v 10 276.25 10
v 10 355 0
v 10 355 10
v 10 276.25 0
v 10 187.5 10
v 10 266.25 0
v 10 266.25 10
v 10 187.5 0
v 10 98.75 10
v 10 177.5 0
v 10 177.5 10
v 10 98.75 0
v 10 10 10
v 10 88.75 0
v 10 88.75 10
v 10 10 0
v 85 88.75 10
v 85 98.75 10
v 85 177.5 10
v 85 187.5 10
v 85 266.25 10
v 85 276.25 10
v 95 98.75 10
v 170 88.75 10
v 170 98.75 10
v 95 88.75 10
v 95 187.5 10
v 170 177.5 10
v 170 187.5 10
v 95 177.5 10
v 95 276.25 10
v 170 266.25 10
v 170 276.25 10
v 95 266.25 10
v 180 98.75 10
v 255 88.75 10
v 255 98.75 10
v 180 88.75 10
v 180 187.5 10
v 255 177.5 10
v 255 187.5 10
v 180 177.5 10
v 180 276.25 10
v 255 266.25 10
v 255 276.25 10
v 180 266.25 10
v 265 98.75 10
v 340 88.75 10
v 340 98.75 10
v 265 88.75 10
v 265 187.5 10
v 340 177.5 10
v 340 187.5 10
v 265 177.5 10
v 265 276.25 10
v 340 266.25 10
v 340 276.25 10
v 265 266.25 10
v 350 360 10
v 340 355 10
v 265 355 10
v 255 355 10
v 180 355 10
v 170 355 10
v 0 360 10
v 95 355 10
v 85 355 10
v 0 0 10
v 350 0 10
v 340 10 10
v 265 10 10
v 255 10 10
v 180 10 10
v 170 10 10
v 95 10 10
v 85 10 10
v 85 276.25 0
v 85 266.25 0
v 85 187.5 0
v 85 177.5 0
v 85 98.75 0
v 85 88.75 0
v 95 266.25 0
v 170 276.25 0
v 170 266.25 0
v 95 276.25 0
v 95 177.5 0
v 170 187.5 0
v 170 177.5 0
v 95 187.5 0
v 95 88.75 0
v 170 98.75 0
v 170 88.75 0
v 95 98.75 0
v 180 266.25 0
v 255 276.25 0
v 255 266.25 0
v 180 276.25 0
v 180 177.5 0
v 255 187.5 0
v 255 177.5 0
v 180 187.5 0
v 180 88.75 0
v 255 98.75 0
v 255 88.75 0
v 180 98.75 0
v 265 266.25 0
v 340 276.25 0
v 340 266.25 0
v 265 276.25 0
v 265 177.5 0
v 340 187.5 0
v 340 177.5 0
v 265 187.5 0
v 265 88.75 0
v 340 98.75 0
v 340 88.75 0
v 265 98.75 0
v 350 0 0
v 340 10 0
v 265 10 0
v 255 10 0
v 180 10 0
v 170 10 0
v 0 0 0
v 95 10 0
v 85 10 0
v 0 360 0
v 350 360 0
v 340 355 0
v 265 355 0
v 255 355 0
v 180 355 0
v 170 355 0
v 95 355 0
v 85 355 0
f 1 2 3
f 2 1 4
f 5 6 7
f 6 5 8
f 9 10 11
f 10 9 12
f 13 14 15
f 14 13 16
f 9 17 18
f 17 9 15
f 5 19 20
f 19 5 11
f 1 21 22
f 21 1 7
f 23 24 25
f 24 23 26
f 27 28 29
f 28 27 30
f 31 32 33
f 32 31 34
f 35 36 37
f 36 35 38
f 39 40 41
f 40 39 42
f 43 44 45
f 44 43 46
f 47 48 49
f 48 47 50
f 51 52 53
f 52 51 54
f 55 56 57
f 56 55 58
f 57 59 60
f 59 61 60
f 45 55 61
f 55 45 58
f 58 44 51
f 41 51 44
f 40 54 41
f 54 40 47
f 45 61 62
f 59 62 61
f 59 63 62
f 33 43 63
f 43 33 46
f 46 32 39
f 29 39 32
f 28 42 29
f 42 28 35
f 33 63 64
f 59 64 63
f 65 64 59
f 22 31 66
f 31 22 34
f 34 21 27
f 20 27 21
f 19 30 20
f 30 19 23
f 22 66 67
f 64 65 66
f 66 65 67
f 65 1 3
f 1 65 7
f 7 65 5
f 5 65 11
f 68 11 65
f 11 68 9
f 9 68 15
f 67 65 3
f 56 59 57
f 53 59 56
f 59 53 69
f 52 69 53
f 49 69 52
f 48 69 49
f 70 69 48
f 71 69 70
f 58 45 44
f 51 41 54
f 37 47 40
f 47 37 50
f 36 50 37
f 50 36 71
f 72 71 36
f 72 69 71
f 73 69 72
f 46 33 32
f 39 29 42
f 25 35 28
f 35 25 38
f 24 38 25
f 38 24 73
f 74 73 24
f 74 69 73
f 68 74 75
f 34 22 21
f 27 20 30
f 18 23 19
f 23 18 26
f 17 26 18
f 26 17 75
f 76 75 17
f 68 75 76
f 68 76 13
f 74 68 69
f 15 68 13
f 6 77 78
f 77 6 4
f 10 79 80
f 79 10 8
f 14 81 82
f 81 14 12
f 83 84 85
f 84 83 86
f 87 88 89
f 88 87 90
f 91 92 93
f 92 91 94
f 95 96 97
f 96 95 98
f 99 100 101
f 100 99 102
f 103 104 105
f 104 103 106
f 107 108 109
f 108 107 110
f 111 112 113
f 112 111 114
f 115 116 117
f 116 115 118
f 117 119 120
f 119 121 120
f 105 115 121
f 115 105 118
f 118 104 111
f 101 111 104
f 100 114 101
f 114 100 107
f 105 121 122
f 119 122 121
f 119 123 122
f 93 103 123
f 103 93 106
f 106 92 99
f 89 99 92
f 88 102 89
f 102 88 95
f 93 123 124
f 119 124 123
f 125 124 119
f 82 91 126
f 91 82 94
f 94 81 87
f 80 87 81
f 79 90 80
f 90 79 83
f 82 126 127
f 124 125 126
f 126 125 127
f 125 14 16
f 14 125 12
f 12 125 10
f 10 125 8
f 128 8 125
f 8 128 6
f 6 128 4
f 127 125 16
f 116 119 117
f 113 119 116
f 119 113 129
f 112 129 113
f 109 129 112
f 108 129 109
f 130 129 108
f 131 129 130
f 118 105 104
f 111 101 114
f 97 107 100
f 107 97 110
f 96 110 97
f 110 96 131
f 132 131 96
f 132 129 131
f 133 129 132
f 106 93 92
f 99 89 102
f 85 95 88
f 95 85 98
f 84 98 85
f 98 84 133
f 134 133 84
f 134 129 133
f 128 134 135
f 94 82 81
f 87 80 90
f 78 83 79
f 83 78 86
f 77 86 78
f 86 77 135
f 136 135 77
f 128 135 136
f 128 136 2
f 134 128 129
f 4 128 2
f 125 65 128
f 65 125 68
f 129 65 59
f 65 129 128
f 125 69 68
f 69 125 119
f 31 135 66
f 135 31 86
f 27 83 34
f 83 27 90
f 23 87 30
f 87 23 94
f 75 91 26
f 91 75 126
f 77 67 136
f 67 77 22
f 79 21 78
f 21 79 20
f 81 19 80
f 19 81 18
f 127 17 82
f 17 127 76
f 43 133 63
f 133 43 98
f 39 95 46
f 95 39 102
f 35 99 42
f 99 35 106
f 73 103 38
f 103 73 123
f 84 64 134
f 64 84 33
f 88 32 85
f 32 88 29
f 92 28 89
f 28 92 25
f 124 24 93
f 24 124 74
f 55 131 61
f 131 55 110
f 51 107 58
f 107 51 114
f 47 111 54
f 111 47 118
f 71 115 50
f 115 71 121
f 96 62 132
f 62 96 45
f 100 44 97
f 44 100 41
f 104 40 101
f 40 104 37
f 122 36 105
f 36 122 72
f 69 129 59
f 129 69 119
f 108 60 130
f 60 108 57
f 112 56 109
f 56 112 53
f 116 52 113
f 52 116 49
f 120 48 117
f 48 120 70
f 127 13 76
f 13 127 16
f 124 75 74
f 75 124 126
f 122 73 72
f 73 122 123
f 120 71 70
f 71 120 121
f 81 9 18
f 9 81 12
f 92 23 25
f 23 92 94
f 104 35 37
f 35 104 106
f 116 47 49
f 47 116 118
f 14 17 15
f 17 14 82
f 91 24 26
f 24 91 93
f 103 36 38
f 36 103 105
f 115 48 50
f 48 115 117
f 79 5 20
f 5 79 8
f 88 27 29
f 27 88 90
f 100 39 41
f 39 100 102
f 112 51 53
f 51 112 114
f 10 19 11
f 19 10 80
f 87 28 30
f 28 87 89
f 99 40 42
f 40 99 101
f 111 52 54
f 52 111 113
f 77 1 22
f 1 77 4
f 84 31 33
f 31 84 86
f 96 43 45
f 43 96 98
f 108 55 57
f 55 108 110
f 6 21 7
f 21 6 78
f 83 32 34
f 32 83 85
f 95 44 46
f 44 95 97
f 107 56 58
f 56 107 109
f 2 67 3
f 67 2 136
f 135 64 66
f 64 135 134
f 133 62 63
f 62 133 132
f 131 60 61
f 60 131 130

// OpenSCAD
// face_band.scad reused for right face upper band

width = 350;
band_h = 360;
thk = 10;
full_height = 720;
h_bar_count = 9;
h_gap = (full_height - h_bar_count * thk) / (h_bar_count - 1);
v_gap_count = 4;
v_bars = v_gap_count + 1;
v_gap = (width - v_bars * thk) / v_gap_count;
$fn = 32;

module face_band(w=width, bh=band_h, t=thk) {
    union() {
        for (i = [0 : v_bars - 1]) {
            x = i * (t + v_gap);
            translate([x, 0, 0]) cube([t, bh, t]);
        }
        for (j = [0 : h_bar_count - 1]) {
            y_full = j * (t + h_gap);
            if (y_full < bh && (y_full + t) > 0) {
                intersection() {
                    translate([0, y_full, 0]) cube([w, t, t]);
                    translate([0, 0, 0]) cube([w, bh, t]);
                }
            }
        }
    }
}

face_band();
